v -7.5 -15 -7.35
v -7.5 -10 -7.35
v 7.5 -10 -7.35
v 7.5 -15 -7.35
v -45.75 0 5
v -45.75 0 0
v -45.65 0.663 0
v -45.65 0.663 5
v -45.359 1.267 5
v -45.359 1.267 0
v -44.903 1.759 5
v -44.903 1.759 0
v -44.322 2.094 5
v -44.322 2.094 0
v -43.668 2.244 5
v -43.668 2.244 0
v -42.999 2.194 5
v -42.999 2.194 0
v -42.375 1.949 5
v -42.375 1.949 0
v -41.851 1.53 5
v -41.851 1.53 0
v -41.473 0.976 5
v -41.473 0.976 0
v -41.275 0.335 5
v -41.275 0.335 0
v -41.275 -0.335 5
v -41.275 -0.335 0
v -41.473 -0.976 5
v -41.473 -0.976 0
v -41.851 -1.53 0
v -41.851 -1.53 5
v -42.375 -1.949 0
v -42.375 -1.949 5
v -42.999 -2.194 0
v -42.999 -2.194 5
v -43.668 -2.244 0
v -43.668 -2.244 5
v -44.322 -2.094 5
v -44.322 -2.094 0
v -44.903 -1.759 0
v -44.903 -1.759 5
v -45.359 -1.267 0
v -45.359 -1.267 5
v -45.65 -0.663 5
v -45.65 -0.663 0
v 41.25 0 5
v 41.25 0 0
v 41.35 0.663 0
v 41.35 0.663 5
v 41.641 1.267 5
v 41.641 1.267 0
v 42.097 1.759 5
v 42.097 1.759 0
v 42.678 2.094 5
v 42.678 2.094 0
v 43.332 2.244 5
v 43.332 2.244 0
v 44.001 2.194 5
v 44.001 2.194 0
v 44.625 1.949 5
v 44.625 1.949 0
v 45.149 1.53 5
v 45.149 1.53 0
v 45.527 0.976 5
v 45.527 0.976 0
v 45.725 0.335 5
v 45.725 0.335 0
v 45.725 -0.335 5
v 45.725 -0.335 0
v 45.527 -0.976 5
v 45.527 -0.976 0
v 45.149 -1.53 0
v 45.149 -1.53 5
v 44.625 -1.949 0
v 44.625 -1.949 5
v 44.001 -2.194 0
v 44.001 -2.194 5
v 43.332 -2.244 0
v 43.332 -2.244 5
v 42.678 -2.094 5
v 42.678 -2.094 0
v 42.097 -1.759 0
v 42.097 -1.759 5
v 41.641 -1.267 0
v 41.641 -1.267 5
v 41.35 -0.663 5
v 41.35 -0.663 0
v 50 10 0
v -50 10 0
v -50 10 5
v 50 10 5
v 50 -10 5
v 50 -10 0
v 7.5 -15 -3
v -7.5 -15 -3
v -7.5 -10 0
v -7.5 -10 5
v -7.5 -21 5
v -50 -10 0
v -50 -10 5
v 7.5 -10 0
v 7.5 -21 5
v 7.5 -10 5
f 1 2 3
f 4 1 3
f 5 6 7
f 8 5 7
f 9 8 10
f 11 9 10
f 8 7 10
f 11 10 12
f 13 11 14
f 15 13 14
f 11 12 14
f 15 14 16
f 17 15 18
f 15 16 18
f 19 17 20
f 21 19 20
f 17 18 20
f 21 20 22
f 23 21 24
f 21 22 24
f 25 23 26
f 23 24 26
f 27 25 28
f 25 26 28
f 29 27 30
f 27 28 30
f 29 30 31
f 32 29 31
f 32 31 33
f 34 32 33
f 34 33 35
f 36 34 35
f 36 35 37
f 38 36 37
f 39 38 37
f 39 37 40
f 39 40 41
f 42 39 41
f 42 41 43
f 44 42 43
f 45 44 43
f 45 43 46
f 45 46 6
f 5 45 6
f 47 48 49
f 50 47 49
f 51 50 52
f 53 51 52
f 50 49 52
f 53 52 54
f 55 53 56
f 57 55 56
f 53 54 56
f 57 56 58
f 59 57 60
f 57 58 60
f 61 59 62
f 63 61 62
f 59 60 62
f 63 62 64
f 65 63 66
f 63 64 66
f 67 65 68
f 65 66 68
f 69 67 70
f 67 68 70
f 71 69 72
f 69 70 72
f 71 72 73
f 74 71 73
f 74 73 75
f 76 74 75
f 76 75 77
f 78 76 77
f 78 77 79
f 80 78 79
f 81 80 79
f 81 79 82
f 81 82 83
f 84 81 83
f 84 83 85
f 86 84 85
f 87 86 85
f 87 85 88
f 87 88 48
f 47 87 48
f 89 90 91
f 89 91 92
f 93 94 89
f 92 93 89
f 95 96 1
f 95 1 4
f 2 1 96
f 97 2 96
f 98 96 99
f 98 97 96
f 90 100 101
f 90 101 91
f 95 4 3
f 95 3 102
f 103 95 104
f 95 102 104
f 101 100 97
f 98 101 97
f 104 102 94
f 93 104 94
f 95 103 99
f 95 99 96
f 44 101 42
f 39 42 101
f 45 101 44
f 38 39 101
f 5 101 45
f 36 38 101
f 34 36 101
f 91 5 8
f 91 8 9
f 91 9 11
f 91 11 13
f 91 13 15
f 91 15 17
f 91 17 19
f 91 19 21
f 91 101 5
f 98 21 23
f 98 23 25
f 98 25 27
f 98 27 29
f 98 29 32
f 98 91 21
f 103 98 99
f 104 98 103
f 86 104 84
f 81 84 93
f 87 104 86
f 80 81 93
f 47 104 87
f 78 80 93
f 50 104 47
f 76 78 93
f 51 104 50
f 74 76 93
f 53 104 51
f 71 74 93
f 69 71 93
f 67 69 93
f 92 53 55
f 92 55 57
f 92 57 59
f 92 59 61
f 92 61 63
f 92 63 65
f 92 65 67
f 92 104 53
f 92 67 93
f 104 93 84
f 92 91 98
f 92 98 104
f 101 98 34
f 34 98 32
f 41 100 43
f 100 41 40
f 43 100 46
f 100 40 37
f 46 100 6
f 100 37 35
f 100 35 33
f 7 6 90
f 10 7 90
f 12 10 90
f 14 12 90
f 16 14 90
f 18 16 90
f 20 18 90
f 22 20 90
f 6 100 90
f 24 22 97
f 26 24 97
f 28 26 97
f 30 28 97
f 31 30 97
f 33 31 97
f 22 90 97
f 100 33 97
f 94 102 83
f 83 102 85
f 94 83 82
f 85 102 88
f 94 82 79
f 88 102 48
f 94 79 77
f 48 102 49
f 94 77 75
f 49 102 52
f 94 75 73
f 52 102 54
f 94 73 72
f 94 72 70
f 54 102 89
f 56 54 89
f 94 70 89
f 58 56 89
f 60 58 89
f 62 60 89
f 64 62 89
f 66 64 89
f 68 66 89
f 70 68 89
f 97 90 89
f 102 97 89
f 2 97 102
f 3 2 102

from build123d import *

# Parameters (mm, degrees)
SKETCH_1_W          = 100
SKETCH_1_H          = 20
EXTRUDE_1_DEPTH     = 5
HOLE_WIZARD_M4_1_D  = 4.5
SKETCH_4_W          = 15
SKETCH_4_H          = 5
EXTRUDE_2_DEPTH     = 5
SKETCH_5_W          = 15
SKETCH_5_H          = 5
EXTRUDE_3_DEPTH     = 7.35
SKETCH_6_W          = 15
SKETCH_6_H          = 8
EXTRUDE_4_DEPTH     = 6
CUT_EXTRUDE_1_DEPTH = 62.654460504


with BuildPart() as part:
    # 스케치1 → 보스-돌출1 (new body)
    with BuildSketch(Plane.XY):
        Rectangle(SKETCH_1_W, SKETCH_1_H)
    extrude(amount=EXTRUDE_1_DEPTH)

    # M4 여유 구멍1 (through all)
    with Locations(Plane.XY.offset(5)):
        with Locations((-43.5, 0), (43.5, 0)):
            Hole(HOLE_WIZARD_M4_1_D / 2)

    # 스케치4 → 보스-돌출2 (add)
    with BuildSketch(Plane(origin=(0, -10, 0), x_dir=(1, 0, 0), z_dir=(0, 1, 0))):
        with Locations((0, -2.5)):
            Rectangle(SKETCH_4_W, SKETCH_4_H)
    extrude(amount=-EXTRUDE_2_DEPTH)

    # 스케치5 → 보스-돌출3 (add)
    with BuildSketch(Plane.XY):
        with Locations((0, -12.5)):
            Rectangle(SKETCH_5_W, SKETCH_5_H)
    extrude(amount=-EXTRUDE_3_DEPTH)

    # 스케치6 → 보스-돌출4 (add)
    with BuildSketch(Plane.XZ.offset(15)):
        with Locations((0, 1)):
            Rectangle(SKETCH_6_W, SKETCH_6_H)
    extrude(amount=EXTRUDE_4_DEPTH)

    # 스케치7 → 컷-돌출1 (cut, through all)
    with BuildSketch(Plane(origin=(7.5, 0, 0), x_dir=(0, 0, -1), z_dir=(1, 0, 0))):
        Polygon((3, -21), (-5, -21), (3, -15), align=None)
    extrude(amount=-CUT_EXTRUDE_1_DEPTH, mode=Mode.SUBTRACT)


solid = part.part
